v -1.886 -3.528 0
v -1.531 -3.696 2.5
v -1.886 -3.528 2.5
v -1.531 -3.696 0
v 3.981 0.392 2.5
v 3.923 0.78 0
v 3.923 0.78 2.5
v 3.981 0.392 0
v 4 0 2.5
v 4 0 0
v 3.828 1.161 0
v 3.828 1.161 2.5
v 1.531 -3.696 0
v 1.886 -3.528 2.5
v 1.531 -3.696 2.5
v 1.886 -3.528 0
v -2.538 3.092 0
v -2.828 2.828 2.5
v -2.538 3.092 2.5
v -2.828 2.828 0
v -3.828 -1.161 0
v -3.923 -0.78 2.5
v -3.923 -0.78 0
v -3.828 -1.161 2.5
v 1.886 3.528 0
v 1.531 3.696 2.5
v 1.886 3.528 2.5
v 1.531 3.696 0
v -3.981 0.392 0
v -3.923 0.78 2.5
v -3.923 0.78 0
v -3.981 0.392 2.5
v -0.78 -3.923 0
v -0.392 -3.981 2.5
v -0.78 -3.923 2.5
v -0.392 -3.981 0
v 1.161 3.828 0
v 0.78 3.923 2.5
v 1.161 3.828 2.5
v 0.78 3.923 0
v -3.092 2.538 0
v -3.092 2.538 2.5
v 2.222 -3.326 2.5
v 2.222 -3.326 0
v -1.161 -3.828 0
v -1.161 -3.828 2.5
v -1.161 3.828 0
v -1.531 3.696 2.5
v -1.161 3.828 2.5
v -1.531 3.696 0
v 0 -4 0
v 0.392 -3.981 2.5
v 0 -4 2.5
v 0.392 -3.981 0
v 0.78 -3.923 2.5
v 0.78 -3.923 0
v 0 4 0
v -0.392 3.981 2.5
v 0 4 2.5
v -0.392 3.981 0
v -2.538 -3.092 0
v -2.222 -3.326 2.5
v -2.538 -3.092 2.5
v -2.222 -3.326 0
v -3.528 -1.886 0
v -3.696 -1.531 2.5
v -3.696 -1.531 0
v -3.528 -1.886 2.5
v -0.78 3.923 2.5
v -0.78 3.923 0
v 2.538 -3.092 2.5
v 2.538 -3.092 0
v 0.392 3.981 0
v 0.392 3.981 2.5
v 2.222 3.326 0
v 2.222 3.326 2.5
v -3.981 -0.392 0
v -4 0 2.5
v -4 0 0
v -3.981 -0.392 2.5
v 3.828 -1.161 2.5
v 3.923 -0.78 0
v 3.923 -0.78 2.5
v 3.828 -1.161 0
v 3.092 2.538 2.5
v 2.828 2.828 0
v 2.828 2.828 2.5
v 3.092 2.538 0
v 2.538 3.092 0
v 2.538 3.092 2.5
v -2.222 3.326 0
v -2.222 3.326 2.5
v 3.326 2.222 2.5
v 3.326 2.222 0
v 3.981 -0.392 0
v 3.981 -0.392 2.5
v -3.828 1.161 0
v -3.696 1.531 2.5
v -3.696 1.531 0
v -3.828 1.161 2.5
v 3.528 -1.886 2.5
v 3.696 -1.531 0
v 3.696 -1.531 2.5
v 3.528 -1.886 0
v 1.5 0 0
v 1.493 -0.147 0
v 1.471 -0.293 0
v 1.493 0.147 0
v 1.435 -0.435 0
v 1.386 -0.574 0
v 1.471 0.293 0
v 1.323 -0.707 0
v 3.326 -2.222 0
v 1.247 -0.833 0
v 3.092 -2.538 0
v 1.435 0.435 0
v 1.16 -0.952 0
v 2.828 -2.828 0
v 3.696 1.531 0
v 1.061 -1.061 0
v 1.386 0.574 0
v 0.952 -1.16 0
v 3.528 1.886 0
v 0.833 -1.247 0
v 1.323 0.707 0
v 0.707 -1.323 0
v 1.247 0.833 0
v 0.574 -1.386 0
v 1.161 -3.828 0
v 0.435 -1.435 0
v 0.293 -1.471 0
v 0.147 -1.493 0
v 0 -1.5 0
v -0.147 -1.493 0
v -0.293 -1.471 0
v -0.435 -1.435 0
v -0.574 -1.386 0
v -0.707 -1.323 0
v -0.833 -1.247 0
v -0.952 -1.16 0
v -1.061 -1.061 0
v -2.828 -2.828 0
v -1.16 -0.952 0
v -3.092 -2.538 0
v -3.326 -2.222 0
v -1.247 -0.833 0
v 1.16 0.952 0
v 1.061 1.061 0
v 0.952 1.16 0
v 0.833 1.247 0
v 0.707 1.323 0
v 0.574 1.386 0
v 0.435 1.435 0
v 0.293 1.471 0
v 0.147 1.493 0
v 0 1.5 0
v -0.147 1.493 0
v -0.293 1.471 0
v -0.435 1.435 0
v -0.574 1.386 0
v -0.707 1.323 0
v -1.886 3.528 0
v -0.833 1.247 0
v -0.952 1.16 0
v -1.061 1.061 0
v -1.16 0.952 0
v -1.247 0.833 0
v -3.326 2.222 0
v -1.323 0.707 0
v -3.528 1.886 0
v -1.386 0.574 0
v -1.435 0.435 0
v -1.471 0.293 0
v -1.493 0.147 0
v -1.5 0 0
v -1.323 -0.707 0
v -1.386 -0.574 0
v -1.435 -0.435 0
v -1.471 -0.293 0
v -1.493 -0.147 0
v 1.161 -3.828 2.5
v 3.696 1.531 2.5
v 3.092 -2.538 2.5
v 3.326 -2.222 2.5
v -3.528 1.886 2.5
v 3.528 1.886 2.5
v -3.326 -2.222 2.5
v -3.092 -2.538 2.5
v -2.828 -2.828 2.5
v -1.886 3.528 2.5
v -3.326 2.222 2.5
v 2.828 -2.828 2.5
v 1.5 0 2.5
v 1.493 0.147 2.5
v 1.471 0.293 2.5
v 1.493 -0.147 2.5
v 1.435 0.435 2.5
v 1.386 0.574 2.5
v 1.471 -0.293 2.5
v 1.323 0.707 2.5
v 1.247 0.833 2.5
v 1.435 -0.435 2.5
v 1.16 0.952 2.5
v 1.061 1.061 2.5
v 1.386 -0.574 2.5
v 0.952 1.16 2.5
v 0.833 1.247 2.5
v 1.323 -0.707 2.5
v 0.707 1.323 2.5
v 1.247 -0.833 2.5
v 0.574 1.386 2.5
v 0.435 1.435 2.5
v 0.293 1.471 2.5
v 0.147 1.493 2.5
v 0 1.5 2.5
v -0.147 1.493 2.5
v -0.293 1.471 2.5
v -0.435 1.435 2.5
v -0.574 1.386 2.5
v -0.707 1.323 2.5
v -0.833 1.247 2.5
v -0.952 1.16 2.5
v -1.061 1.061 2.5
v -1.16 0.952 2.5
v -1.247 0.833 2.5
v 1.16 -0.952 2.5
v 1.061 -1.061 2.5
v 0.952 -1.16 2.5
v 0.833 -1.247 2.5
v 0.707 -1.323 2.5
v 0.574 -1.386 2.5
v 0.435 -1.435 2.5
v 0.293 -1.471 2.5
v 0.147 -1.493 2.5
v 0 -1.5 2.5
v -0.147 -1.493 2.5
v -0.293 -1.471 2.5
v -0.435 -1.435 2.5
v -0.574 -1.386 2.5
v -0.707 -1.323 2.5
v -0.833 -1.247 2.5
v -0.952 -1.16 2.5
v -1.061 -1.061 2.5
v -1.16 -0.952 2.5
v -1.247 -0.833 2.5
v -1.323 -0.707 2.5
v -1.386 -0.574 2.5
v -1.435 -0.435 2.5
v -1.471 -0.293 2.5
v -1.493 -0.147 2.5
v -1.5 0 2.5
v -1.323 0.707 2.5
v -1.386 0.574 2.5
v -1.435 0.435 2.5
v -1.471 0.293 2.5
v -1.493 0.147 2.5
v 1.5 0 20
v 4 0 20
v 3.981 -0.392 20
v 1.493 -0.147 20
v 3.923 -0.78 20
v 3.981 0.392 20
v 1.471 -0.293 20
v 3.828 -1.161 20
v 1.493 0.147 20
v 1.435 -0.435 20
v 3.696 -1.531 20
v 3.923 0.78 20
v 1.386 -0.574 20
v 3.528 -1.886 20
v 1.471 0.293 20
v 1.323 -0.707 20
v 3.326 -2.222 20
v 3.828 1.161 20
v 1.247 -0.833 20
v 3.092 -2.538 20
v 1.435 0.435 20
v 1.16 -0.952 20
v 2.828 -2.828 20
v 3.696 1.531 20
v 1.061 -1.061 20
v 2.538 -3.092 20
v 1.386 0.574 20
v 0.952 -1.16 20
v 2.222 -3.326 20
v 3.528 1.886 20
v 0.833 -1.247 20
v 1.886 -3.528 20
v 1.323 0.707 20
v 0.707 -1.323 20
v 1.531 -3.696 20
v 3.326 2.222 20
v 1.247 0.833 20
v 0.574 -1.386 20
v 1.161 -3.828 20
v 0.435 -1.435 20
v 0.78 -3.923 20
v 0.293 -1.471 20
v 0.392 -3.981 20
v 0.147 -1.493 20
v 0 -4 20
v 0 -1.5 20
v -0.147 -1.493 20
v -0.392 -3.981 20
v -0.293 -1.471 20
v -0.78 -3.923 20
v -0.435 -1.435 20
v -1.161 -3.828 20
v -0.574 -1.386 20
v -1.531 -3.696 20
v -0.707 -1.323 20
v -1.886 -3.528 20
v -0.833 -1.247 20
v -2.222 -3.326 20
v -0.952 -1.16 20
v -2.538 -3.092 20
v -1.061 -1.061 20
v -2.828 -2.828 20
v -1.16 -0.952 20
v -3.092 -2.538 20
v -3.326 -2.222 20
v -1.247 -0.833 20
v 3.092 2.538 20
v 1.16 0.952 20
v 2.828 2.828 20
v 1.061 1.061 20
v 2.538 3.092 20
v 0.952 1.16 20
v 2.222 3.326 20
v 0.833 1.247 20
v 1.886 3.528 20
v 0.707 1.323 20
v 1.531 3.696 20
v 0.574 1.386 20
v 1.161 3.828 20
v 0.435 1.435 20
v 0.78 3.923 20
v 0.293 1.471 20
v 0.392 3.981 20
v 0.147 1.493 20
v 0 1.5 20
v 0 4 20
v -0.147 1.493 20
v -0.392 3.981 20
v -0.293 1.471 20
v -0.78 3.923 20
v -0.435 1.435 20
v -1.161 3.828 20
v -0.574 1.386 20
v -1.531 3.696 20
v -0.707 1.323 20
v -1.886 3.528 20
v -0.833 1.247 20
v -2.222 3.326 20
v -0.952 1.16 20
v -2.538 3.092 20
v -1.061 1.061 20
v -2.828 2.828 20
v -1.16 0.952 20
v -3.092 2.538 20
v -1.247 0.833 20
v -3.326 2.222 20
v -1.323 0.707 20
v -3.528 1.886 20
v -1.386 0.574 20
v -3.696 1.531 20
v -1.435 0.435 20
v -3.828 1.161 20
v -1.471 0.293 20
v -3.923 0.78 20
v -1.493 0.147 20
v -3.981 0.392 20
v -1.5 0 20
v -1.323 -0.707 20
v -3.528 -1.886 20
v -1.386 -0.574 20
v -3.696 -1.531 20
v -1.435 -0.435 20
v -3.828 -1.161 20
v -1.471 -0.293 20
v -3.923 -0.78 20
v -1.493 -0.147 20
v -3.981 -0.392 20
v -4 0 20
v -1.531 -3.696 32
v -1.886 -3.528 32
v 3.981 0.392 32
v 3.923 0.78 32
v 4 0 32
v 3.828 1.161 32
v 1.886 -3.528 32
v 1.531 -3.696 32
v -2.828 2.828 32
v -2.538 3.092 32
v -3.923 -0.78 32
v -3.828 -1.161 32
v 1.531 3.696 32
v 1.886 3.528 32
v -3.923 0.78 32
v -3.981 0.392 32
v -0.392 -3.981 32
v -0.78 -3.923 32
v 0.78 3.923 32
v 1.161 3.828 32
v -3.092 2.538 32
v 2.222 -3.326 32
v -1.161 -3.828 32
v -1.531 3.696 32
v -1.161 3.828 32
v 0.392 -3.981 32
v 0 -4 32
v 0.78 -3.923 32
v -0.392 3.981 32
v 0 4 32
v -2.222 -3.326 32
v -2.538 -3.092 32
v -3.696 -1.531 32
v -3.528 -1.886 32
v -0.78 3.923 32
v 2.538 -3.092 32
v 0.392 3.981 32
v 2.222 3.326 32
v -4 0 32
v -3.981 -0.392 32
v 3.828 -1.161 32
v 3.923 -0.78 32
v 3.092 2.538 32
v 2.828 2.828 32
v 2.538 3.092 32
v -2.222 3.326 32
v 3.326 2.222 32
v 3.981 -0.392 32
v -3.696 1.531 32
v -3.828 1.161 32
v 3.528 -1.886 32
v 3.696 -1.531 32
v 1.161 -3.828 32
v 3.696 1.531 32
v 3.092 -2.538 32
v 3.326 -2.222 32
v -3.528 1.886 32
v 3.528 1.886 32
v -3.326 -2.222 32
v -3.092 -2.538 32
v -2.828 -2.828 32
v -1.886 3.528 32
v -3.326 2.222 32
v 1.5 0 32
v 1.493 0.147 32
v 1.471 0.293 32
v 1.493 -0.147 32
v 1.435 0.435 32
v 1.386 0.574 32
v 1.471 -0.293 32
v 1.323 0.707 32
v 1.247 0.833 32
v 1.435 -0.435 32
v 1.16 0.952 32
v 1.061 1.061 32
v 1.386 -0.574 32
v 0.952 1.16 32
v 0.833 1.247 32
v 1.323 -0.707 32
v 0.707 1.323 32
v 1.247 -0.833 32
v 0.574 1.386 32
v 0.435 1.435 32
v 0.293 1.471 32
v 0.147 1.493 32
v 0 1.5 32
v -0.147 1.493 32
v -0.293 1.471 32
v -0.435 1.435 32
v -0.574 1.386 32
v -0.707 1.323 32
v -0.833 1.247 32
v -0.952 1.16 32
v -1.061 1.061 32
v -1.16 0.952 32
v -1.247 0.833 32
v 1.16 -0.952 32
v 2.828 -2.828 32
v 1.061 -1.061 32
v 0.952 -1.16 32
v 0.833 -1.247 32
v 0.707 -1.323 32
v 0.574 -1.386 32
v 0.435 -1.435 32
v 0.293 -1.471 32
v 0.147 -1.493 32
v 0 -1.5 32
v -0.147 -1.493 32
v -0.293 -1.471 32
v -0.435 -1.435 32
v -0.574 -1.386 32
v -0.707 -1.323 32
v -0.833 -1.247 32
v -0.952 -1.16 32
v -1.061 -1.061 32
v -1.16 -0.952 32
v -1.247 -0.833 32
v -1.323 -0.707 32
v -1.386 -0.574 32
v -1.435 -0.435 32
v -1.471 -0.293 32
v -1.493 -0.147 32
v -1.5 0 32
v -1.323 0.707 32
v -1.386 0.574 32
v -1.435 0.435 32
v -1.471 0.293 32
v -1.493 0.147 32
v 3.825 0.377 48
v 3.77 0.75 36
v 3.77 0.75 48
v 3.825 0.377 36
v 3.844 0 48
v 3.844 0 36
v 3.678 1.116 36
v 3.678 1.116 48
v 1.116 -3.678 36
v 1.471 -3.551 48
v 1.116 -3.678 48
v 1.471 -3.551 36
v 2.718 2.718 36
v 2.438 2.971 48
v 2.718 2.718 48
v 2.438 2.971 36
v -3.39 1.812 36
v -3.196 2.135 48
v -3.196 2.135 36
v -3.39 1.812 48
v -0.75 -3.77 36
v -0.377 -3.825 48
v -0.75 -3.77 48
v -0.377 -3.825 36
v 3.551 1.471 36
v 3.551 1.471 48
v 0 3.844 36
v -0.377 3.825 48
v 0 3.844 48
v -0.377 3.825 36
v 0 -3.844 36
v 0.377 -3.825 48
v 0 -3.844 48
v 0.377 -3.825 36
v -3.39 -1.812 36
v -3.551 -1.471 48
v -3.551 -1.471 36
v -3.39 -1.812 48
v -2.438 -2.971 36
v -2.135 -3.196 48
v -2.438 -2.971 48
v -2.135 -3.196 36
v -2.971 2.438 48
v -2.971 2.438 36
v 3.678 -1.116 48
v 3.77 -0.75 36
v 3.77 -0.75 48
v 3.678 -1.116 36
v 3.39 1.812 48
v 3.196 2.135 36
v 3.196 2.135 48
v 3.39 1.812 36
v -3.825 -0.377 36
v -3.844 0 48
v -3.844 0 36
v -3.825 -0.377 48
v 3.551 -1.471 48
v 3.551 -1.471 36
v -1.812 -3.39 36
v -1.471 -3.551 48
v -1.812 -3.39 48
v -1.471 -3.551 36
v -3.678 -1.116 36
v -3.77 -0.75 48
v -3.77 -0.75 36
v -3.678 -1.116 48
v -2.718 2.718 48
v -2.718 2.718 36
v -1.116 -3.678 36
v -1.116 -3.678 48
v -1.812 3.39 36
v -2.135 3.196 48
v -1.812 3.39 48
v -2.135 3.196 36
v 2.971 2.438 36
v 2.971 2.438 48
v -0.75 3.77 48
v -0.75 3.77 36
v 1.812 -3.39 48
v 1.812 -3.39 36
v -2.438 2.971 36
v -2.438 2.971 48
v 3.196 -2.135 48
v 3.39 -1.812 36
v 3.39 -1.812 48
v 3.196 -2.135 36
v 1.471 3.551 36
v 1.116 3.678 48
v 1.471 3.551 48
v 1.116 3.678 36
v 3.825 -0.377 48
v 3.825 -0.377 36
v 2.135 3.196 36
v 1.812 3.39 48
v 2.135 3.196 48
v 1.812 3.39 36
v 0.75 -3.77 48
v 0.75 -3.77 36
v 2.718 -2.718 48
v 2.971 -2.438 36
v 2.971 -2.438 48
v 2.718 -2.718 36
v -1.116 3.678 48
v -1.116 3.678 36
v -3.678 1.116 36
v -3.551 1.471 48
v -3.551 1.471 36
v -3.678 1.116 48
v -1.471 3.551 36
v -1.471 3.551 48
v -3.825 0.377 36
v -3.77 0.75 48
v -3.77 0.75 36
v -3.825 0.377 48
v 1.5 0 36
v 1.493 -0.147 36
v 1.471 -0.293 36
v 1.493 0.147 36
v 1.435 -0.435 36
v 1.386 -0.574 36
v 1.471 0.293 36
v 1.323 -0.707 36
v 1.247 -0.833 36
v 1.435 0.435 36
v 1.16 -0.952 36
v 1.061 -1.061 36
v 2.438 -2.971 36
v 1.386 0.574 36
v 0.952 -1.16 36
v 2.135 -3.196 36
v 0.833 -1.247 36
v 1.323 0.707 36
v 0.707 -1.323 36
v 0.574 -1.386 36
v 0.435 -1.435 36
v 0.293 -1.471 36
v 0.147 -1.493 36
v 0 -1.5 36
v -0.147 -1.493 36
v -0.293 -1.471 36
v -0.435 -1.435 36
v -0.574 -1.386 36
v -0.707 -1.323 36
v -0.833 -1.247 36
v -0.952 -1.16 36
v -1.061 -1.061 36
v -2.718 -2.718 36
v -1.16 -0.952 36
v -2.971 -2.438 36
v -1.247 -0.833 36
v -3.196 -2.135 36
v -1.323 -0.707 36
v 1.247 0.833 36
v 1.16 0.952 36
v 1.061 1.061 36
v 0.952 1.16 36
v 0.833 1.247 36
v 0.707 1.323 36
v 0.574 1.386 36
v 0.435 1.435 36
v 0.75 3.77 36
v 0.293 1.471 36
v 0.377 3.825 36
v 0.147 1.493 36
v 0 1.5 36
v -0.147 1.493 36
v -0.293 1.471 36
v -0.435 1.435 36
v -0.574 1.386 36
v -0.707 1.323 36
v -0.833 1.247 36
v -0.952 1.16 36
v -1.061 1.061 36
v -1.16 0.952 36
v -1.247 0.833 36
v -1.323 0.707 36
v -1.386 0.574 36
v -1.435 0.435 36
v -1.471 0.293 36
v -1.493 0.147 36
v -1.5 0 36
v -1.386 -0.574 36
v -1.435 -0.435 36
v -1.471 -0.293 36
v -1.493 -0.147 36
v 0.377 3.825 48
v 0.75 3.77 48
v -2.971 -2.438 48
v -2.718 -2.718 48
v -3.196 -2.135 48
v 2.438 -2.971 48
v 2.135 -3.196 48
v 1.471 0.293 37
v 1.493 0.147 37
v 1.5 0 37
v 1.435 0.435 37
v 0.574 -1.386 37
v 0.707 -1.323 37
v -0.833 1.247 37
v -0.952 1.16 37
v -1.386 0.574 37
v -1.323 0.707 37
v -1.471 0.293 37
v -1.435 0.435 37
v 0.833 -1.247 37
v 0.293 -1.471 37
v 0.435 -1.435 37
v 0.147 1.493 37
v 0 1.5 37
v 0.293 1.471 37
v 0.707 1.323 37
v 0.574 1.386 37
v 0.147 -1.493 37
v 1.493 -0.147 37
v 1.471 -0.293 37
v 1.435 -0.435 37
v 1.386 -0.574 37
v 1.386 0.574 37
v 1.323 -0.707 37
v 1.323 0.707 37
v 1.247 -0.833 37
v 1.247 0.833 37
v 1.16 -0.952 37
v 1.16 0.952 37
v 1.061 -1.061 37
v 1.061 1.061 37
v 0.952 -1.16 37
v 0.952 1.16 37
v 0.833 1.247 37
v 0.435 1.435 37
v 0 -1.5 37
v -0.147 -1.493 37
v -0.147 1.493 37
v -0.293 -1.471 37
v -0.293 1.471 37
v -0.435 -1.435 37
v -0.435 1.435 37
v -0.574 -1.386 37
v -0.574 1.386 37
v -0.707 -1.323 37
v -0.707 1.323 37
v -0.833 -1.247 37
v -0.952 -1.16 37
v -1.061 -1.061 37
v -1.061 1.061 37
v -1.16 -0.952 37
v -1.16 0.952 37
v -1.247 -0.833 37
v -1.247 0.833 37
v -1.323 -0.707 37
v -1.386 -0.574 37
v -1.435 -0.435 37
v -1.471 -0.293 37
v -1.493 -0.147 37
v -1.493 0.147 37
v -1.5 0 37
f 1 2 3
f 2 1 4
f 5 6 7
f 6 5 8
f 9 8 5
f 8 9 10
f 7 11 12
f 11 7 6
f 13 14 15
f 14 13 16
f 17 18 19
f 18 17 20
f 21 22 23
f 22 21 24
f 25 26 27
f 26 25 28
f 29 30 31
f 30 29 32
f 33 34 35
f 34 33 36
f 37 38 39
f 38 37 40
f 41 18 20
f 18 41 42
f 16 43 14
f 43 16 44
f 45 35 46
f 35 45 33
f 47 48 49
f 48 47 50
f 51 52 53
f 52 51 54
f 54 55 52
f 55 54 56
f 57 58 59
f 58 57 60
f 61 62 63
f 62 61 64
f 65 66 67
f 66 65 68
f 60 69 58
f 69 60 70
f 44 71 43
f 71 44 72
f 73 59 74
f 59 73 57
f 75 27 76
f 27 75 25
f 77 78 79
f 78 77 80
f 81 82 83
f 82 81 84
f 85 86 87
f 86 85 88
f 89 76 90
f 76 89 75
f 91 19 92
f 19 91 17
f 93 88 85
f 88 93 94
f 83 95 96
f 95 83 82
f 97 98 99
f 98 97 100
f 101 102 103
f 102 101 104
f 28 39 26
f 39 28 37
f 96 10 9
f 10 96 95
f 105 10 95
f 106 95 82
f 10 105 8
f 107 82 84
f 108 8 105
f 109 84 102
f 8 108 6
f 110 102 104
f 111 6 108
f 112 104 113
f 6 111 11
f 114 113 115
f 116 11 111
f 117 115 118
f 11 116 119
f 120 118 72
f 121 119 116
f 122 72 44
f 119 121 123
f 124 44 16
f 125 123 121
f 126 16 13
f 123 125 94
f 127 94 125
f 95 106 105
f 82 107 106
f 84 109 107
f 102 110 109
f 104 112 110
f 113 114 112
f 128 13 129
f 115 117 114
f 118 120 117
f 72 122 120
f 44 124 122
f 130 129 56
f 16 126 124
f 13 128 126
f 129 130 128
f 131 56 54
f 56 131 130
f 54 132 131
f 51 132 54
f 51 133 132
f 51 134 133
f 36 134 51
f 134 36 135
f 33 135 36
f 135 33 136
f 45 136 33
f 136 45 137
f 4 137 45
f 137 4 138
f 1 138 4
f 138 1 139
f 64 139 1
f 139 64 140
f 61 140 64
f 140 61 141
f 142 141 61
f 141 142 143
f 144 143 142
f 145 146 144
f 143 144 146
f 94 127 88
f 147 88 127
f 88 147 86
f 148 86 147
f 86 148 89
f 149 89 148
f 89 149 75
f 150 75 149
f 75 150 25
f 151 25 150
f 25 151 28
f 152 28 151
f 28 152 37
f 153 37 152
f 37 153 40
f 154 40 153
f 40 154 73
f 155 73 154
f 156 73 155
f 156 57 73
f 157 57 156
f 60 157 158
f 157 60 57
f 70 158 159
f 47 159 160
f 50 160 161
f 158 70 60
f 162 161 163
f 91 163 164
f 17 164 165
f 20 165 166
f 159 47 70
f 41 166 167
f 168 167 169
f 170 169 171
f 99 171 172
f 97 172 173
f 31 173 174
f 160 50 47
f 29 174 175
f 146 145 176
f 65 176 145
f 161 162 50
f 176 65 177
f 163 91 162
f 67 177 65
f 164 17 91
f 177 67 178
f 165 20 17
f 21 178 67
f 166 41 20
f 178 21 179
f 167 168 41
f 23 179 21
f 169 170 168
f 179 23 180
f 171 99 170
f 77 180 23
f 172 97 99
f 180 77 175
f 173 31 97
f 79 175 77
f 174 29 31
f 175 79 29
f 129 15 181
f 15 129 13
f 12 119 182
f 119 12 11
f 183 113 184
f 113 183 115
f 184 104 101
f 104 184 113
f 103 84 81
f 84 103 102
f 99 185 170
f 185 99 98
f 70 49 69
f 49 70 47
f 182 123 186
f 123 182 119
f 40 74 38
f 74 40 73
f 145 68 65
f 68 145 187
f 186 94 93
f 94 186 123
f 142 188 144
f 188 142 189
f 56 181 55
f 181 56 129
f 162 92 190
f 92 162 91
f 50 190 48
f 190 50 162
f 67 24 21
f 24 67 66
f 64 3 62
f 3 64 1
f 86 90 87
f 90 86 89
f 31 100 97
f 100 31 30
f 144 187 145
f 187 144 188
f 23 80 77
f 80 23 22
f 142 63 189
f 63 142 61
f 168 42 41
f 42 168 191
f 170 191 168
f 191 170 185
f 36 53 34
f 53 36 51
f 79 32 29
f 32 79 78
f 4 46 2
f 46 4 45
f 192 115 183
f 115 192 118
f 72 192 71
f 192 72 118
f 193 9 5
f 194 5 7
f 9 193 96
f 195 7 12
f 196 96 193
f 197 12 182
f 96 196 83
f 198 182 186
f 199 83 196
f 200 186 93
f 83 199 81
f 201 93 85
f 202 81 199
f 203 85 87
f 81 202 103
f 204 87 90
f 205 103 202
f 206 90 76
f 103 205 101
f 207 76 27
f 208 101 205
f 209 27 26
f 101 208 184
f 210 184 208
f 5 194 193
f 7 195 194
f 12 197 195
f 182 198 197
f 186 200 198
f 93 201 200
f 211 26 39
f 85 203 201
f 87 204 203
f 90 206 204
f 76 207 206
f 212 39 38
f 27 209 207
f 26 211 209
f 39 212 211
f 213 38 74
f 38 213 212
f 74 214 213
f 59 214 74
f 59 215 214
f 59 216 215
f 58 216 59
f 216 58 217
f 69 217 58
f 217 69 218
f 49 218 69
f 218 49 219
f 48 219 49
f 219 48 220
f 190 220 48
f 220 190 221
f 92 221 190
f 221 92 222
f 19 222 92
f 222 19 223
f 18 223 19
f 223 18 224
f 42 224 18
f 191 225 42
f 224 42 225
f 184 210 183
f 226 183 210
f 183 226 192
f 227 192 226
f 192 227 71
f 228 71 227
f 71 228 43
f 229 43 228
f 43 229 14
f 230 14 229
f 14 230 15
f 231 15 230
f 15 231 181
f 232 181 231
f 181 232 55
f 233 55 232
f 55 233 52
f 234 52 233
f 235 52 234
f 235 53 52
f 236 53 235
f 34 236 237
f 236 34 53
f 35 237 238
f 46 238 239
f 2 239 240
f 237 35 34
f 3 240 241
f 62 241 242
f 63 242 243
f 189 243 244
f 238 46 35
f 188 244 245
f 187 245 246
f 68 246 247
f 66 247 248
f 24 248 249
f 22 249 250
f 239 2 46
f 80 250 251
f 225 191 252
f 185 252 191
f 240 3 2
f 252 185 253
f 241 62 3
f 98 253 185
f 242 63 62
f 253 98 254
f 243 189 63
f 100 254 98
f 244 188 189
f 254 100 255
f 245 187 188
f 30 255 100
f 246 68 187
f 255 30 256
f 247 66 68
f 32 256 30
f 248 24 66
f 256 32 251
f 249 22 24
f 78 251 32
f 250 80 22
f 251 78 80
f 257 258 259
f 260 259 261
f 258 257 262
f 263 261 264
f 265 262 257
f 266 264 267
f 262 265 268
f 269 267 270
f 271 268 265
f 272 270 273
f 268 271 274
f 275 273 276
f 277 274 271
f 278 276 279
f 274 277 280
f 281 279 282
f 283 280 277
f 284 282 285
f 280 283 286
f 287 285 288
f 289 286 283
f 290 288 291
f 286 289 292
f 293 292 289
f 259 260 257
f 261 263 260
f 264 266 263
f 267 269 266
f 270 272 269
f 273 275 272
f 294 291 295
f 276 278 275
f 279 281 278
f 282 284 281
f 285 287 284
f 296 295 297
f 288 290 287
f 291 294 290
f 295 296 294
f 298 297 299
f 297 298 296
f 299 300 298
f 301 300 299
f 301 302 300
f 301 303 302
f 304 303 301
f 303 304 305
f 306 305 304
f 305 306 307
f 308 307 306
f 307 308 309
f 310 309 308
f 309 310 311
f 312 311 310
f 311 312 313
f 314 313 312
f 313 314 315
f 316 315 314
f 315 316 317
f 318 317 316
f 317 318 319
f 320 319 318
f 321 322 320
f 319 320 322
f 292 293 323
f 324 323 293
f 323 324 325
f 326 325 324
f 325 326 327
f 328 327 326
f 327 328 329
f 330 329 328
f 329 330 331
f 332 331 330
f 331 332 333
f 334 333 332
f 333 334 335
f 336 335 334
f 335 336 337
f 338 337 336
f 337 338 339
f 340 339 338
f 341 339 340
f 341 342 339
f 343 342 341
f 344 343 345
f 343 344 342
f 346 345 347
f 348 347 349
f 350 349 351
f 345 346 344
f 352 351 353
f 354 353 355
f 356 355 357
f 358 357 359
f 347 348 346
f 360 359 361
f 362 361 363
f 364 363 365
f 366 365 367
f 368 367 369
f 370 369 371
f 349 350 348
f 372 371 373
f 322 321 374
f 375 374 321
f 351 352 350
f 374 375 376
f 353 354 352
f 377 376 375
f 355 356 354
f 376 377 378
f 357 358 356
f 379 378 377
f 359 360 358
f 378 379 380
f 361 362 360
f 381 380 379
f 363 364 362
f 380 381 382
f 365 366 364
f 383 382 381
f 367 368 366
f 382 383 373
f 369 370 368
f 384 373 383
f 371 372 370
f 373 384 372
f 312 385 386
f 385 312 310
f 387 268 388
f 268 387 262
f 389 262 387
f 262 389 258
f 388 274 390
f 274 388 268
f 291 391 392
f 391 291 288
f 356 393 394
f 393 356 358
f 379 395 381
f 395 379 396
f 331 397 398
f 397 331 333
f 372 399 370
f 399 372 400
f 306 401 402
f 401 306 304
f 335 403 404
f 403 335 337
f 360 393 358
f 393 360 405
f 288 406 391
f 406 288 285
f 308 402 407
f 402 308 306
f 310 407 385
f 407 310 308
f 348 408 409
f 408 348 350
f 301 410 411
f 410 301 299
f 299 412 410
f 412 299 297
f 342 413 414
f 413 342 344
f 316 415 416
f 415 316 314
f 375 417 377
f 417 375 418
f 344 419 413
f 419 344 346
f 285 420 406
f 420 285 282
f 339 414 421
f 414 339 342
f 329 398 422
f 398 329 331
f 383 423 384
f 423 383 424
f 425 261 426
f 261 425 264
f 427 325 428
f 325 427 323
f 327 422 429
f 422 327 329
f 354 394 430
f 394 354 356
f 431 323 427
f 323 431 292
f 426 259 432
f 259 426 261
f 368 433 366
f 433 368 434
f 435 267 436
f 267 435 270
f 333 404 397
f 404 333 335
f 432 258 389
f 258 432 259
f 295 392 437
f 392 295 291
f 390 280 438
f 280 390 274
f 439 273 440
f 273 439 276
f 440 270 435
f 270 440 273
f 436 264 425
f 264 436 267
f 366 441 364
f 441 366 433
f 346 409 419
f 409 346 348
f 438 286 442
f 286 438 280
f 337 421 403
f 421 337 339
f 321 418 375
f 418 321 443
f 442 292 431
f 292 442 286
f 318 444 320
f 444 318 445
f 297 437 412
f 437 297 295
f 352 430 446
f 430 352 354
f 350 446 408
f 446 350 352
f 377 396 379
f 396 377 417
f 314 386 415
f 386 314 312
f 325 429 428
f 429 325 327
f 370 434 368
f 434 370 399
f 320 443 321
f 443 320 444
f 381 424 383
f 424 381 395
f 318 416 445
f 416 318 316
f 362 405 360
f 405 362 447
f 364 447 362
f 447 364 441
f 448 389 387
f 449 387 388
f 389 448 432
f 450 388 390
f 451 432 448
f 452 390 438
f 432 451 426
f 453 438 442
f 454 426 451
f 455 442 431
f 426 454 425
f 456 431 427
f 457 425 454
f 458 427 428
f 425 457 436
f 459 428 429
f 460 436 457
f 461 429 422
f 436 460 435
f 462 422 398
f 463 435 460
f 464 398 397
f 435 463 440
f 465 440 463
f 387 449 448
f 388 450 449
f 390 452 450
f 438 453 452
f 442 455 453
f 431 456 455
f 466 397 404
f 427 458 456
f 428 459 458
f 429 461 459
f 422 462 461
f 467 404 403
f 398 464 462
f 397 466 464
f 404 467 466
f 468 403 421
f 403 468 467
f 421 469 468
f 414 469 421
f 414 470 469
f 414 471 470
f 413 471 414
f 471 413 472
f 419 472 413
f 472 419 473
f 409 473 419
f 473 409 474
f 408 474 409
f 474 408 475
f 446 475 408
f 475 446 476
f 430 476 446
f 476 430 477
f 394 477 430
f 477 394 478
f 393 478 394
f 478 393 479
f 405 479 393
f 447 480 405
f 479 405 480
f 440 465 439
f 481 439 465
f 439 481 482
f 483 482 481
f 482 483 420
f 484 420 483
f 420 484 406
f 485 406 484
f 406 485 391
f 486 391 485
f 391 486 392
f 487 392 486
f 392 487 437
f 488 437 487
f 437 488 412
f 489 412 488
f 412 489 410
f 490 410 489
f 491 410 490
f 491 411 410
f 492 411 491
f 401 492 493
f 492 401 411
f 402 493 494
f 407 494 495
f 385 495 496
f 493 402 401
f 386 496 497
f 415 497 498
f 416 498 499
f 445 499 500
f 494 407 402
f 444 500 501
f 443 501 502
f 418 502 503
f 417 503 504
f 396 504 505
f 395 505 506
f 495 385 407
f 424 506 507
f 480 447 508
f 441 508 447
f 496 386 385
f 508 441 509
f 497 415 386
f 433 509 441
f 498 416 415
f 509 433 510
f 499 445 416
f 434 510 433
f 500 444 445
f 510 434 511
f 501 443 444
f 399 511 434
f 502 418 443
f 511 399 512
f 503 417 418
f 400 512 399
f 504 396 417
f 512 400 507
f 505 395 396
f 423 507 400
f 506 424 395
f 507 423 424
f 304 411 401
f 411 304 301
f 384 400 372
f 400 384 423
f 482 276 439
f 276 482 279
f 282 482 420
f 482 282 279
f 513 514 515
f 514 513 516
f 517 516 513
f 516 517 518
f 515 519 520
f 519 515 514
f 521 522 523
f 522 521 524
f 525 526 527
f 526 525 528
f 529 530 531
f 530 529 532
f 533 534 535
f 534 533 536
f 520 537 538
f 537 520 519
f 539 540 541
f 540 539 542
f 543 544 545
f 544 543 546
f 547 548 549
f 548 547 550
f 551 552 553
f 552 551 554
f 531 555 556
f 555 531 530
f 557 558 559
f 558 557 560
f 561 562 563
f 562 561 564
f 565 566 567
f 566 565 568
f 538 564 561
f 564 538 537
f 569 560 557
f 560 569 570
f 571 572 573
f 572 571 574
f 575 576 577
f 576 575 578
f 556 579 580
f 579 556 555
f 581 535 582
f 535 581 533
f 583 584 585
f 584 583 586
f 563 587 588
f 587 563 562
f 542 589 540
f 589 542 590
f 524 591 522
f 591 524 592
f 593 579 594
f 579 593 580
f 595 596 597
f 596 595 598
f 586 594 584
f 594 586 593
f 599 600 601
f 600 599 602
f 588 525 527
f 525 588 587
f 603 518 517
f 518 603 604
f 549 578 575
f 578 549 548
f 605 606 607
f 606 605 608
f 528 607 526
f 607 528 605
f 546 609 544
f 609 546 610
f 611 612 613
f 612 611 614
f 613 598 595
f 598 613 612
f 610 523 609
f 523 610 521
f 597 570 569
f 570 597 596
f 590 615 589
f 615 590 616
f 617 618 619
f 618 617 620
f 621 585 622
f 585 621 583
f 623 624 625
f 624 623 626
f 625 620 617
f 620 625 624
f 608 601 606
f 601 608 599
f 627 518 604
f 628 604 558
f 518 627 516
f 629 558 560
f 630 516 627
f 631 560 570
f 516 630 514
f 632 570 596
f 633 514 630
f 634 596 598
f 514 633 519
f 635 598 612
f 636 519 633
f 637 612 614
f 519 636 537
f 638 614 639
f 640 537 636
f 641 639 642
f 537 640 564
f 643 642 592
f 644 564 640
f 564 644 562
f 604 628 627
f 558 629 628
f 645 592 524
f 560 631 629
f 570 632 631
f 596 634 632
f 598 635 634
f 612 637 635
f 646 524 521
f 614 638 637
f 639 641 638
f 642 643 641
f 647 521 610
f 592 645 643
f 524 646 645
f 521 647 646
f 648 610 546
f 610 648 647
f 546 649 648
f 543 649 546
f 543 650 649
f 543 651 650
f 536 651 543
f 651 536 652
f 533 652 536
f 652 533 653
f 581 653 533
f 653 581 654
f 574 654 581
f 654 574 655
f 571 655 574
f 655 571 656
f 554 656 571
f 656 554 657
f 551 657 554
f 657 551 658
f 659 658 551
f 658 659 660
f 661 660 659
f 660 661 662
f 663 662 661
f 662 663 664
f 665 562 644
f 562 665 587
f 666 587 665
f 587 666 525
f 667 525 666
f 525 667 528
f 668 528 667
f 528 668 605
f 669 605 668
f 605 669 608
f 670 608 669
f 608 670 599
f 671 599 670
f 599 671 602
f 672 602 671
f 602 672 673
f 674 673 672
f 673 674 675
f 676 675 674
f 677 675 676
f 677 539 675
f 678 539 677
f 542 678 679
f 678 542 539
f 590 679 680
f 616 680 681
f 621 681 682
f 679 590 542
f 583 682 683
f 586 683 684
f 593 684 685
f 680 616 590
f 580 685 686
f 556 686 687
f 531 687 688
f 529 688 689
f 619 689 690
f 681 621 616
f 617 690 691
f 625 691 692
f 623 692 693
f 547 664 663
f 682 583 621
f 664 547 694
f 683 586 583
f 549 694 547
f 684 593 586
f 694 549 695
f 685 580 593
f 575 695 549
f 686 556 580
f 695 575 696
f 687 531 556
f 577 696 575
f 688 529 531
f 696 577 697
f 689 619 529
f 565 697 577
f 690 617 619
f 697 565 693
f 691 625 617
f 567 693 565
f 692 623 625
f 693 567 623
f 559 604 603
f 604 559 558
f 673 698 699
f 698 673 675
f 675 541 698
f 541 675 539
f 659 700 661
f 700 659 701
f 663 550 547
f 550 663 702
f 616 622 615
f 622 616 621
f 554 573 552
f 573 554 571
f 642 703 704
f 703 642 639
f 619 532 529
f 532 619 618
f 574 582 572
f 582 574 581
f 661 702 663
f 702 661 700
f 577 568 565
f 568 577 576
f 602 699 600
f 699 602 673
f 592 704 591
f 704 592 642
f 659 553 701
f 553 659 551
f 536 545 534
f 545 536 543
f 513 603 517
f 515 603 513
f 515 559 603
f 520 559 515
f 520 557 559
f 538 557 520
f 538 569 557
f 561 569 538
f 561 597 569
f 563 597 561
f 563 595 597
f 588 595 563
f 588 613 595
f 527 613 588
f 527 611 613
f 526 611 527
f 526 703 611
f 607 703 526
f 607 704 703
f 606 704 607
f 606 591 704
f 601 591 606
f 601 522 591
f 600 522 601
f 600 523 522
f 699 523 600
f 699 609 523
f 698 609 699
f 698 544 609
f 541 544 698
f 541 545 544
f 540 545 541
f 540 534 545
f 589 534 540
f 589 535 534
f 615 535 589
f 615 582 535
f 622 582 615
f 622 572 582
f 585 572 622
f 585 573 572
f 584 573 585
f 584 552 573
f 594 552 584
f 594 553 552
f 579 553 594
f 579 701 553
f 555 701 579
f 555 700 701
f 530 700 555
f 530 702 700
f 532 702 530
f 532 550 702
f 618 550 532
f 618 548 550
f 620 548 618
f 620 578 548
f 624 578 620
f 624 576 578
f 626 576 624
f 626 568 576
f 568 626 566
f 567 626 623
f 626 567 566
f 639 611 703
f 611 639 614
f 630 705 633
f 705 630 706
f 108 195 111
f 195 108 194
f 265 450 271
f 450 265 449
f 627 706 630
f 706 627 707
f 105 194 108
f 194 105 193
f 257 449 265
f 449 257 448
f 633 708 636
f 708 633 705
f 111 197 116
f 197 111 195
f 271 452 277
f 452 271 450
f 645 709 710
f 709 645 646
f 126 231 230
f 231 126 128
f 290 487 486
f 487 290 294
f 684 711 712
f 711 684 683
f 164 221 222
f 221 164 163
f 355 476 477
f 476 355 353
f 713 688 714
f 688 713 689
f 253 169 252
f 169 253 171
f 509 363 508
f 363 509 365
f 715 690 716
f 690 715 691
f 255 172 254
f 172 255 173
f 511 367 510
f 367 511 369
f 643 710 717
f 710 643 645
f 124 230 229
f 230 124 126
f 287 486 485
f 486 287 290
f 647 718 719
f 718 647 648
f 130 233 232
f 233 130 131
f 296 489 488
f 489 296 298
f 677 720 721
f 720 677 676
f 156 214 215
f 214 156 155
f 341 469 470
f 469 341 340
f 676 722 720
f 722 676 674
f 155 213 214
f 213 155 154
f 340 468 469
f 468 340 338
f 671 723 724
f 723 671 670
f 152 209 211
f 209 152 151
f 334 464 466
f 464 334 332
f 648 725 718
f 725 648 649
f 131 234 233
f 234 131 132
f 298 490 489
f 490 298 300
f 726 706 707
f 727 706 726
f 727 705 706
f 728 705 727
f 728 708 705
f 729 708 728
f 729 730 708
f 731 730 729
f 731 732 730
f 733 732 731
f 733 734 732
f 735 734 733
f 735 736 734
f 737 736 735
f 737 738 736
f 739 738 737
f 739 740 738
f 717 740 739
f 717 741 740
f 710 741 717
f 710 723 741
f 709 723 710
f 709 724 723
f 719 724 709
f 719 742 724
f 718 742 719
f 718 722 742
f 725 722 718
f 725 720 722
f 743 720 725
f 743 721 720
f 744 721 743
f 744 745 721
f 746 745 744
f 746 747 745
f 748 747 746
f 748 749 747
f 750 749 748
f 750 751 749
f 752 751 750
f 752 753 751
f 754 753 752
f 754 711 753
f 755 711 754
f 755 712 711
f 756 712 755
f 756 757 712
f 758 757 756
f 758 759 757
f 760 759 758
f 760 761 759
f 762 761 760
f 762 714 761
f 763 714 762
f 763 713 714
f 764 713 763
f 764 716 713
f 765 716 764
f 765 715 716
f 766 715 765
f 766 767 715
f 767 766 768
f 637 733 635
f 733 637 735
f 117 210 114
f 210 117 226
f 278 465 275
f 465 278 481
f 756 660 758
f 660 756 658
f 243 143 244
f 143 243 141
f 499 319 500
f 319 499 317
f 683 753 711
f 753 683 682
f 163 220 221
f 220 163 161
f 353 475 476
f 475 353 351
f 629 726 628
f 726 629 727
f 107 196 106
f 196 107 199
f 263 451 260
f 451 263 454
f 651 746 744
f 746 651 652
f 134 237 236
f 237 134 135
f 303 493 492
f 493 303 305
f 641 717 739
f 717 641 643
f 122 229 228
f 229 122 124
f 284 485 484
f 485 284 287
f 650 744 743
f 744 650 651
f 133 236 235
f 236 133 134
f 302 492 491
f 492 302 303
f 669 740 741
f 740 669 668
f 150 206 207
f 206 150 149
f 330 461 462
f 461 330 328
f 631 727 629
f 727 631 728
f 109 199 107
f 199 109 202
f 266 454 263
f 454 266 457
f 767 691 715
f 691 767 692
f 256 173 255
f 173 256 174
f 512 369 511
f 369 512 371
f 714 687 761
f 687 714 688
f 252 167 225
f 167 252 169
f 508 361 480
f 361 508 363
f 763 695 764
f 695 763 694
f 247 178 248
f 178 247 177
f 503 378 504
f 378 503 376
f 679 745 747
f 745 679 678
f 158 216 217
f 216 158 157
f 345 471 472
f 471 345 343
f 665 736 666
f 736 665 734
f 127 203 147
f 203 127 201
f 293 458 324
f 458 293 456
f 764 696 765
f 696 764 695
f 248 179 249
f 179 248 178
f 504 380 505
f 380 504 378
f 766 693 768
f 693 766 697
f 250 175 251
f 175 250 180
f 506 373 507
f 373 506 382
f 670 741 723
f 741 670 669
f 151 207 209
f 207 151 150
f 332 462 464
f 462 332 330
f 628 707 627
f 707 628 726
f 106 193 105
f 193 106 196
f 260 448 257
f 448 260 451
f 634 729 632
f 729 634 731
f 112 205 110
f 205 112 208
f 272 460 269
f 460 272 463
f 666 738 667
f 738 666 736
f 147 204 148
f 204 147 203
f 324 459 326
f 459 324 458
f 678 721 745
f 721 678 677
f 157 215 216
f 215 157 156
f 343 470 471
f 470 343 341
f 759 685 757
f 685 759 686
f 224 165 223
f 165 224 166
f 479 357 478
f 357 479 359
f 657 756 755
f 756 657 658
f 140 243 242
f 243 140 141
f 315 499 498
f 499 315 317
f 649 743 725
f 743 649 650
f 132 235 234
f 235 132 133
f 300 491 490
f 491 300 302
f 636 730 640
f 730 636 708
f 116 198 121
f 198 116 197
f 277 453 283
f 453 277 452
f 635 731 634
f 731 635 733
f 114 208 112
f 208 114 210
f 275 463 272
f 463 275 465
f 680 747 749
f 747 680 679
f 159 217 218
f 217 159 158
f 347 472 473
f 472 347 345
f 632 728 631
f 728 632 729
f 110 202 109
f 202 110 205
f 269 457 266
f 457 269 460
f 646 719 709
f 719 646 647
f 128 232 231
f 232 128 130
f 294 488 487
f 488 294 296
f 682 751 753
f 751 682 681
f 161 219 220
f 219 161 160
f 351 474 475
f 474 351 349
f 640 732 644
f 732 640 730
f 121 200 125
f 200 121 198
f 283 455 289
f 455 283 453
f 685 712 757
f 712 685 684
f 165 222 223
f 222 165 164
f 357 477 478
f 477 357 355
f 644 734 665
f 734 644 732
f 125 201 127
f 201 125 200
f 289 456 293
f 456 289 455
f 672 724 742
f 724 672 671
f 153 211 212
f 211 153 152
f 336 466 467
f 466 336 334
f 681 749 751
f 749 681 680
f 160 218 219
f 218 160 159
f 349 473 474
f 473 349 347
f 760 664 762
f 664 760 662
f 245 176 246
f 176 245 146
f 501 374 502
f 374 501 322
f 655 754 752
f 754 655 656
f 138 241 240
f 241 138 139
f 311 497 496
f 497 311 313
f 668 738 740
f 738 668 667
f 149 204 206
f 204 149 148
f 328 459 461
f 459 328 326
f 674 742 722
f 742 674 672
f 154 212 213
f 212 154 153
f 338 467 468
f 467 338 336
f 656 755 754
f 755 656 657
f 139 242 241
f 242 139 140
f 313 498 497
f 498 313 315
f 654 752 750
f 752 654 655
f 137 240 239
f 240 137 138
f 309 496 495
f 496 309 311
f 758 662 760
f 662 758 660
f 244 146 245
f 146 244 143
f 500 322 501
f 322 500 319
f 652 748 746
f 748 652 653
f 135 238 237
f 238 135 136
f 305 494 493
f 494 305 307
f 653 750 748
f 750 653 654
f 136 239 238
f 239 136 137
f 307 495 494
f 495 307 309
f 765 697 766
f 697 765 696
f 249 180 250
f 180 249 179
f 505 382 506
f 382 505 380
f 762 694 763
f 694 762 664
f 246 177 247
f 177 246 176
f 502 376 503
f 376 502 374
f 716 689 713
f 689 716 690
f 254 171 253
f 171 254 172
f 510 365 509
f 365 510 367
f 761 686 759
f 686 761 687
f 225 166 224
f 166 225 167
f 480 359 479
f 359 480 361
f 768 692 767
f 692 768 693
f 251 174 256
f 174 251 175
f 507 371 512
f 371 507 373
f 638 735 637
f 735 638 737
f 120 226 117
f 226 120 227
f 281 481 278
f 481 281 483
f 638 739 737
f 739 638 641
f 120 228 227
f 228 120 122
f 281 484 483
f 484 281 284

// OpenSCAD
// Hose-barb reducer - joins two silicone-tubing sizes with a through bore. The two barbs are
// stacked (one above the other) on each port. NOVEL general part (a generic reducer, not any
// one manufacturer's part).
//

tube1_d = 8;
tube2_d = 5;
bore    = 3;
length1 = 20;
length2 = 16;
collar  = 12;

$fn = 64;

saw_teeth = 16;
base_d    = min(tube1_d - 2, tube2_d - 2);         // a base the two barbs share
step      = min(2.5, (tube1_d - base_d) / saw_teeth);
top_d1    = tube1_d - 2;
top_d2    = tube2_d - 2;

difference() {
    union() {
        if (length1 > 0)
            for (z = [0 : length1 / saw_teeth])
                translate([0, 0, z * length1 / saw_teeth])
                    cylinder(h = length1 / saw_teeth, d = base_d + step * saw_teeth);       // lower barb
        if (length2 > 0)
            for (z = [0 : length2 / saw_teeth])
                translate([0, 0, z * length2 / saw_teeth + length1])
                    cylinder(h = length2 / saw_teeth, d = base_d + step * saw_teeth - step);  // upper barb
        if (collar > 0 && length1 > 0)
            translate([0, 0, length1]) cylinder(h = collar, d = min(collar, base_d + step * saw_teeth));
        if (collar > 0 && length2 > 0)
            translate([0, 0, length1 + length2]) cylinder(h = collar, d = min(collar, base_d + step * saw_teeth - step));
    }
    translate([0, 0, -1]) cylinder(h = length1 + length2 + 2, d = bore);
}
